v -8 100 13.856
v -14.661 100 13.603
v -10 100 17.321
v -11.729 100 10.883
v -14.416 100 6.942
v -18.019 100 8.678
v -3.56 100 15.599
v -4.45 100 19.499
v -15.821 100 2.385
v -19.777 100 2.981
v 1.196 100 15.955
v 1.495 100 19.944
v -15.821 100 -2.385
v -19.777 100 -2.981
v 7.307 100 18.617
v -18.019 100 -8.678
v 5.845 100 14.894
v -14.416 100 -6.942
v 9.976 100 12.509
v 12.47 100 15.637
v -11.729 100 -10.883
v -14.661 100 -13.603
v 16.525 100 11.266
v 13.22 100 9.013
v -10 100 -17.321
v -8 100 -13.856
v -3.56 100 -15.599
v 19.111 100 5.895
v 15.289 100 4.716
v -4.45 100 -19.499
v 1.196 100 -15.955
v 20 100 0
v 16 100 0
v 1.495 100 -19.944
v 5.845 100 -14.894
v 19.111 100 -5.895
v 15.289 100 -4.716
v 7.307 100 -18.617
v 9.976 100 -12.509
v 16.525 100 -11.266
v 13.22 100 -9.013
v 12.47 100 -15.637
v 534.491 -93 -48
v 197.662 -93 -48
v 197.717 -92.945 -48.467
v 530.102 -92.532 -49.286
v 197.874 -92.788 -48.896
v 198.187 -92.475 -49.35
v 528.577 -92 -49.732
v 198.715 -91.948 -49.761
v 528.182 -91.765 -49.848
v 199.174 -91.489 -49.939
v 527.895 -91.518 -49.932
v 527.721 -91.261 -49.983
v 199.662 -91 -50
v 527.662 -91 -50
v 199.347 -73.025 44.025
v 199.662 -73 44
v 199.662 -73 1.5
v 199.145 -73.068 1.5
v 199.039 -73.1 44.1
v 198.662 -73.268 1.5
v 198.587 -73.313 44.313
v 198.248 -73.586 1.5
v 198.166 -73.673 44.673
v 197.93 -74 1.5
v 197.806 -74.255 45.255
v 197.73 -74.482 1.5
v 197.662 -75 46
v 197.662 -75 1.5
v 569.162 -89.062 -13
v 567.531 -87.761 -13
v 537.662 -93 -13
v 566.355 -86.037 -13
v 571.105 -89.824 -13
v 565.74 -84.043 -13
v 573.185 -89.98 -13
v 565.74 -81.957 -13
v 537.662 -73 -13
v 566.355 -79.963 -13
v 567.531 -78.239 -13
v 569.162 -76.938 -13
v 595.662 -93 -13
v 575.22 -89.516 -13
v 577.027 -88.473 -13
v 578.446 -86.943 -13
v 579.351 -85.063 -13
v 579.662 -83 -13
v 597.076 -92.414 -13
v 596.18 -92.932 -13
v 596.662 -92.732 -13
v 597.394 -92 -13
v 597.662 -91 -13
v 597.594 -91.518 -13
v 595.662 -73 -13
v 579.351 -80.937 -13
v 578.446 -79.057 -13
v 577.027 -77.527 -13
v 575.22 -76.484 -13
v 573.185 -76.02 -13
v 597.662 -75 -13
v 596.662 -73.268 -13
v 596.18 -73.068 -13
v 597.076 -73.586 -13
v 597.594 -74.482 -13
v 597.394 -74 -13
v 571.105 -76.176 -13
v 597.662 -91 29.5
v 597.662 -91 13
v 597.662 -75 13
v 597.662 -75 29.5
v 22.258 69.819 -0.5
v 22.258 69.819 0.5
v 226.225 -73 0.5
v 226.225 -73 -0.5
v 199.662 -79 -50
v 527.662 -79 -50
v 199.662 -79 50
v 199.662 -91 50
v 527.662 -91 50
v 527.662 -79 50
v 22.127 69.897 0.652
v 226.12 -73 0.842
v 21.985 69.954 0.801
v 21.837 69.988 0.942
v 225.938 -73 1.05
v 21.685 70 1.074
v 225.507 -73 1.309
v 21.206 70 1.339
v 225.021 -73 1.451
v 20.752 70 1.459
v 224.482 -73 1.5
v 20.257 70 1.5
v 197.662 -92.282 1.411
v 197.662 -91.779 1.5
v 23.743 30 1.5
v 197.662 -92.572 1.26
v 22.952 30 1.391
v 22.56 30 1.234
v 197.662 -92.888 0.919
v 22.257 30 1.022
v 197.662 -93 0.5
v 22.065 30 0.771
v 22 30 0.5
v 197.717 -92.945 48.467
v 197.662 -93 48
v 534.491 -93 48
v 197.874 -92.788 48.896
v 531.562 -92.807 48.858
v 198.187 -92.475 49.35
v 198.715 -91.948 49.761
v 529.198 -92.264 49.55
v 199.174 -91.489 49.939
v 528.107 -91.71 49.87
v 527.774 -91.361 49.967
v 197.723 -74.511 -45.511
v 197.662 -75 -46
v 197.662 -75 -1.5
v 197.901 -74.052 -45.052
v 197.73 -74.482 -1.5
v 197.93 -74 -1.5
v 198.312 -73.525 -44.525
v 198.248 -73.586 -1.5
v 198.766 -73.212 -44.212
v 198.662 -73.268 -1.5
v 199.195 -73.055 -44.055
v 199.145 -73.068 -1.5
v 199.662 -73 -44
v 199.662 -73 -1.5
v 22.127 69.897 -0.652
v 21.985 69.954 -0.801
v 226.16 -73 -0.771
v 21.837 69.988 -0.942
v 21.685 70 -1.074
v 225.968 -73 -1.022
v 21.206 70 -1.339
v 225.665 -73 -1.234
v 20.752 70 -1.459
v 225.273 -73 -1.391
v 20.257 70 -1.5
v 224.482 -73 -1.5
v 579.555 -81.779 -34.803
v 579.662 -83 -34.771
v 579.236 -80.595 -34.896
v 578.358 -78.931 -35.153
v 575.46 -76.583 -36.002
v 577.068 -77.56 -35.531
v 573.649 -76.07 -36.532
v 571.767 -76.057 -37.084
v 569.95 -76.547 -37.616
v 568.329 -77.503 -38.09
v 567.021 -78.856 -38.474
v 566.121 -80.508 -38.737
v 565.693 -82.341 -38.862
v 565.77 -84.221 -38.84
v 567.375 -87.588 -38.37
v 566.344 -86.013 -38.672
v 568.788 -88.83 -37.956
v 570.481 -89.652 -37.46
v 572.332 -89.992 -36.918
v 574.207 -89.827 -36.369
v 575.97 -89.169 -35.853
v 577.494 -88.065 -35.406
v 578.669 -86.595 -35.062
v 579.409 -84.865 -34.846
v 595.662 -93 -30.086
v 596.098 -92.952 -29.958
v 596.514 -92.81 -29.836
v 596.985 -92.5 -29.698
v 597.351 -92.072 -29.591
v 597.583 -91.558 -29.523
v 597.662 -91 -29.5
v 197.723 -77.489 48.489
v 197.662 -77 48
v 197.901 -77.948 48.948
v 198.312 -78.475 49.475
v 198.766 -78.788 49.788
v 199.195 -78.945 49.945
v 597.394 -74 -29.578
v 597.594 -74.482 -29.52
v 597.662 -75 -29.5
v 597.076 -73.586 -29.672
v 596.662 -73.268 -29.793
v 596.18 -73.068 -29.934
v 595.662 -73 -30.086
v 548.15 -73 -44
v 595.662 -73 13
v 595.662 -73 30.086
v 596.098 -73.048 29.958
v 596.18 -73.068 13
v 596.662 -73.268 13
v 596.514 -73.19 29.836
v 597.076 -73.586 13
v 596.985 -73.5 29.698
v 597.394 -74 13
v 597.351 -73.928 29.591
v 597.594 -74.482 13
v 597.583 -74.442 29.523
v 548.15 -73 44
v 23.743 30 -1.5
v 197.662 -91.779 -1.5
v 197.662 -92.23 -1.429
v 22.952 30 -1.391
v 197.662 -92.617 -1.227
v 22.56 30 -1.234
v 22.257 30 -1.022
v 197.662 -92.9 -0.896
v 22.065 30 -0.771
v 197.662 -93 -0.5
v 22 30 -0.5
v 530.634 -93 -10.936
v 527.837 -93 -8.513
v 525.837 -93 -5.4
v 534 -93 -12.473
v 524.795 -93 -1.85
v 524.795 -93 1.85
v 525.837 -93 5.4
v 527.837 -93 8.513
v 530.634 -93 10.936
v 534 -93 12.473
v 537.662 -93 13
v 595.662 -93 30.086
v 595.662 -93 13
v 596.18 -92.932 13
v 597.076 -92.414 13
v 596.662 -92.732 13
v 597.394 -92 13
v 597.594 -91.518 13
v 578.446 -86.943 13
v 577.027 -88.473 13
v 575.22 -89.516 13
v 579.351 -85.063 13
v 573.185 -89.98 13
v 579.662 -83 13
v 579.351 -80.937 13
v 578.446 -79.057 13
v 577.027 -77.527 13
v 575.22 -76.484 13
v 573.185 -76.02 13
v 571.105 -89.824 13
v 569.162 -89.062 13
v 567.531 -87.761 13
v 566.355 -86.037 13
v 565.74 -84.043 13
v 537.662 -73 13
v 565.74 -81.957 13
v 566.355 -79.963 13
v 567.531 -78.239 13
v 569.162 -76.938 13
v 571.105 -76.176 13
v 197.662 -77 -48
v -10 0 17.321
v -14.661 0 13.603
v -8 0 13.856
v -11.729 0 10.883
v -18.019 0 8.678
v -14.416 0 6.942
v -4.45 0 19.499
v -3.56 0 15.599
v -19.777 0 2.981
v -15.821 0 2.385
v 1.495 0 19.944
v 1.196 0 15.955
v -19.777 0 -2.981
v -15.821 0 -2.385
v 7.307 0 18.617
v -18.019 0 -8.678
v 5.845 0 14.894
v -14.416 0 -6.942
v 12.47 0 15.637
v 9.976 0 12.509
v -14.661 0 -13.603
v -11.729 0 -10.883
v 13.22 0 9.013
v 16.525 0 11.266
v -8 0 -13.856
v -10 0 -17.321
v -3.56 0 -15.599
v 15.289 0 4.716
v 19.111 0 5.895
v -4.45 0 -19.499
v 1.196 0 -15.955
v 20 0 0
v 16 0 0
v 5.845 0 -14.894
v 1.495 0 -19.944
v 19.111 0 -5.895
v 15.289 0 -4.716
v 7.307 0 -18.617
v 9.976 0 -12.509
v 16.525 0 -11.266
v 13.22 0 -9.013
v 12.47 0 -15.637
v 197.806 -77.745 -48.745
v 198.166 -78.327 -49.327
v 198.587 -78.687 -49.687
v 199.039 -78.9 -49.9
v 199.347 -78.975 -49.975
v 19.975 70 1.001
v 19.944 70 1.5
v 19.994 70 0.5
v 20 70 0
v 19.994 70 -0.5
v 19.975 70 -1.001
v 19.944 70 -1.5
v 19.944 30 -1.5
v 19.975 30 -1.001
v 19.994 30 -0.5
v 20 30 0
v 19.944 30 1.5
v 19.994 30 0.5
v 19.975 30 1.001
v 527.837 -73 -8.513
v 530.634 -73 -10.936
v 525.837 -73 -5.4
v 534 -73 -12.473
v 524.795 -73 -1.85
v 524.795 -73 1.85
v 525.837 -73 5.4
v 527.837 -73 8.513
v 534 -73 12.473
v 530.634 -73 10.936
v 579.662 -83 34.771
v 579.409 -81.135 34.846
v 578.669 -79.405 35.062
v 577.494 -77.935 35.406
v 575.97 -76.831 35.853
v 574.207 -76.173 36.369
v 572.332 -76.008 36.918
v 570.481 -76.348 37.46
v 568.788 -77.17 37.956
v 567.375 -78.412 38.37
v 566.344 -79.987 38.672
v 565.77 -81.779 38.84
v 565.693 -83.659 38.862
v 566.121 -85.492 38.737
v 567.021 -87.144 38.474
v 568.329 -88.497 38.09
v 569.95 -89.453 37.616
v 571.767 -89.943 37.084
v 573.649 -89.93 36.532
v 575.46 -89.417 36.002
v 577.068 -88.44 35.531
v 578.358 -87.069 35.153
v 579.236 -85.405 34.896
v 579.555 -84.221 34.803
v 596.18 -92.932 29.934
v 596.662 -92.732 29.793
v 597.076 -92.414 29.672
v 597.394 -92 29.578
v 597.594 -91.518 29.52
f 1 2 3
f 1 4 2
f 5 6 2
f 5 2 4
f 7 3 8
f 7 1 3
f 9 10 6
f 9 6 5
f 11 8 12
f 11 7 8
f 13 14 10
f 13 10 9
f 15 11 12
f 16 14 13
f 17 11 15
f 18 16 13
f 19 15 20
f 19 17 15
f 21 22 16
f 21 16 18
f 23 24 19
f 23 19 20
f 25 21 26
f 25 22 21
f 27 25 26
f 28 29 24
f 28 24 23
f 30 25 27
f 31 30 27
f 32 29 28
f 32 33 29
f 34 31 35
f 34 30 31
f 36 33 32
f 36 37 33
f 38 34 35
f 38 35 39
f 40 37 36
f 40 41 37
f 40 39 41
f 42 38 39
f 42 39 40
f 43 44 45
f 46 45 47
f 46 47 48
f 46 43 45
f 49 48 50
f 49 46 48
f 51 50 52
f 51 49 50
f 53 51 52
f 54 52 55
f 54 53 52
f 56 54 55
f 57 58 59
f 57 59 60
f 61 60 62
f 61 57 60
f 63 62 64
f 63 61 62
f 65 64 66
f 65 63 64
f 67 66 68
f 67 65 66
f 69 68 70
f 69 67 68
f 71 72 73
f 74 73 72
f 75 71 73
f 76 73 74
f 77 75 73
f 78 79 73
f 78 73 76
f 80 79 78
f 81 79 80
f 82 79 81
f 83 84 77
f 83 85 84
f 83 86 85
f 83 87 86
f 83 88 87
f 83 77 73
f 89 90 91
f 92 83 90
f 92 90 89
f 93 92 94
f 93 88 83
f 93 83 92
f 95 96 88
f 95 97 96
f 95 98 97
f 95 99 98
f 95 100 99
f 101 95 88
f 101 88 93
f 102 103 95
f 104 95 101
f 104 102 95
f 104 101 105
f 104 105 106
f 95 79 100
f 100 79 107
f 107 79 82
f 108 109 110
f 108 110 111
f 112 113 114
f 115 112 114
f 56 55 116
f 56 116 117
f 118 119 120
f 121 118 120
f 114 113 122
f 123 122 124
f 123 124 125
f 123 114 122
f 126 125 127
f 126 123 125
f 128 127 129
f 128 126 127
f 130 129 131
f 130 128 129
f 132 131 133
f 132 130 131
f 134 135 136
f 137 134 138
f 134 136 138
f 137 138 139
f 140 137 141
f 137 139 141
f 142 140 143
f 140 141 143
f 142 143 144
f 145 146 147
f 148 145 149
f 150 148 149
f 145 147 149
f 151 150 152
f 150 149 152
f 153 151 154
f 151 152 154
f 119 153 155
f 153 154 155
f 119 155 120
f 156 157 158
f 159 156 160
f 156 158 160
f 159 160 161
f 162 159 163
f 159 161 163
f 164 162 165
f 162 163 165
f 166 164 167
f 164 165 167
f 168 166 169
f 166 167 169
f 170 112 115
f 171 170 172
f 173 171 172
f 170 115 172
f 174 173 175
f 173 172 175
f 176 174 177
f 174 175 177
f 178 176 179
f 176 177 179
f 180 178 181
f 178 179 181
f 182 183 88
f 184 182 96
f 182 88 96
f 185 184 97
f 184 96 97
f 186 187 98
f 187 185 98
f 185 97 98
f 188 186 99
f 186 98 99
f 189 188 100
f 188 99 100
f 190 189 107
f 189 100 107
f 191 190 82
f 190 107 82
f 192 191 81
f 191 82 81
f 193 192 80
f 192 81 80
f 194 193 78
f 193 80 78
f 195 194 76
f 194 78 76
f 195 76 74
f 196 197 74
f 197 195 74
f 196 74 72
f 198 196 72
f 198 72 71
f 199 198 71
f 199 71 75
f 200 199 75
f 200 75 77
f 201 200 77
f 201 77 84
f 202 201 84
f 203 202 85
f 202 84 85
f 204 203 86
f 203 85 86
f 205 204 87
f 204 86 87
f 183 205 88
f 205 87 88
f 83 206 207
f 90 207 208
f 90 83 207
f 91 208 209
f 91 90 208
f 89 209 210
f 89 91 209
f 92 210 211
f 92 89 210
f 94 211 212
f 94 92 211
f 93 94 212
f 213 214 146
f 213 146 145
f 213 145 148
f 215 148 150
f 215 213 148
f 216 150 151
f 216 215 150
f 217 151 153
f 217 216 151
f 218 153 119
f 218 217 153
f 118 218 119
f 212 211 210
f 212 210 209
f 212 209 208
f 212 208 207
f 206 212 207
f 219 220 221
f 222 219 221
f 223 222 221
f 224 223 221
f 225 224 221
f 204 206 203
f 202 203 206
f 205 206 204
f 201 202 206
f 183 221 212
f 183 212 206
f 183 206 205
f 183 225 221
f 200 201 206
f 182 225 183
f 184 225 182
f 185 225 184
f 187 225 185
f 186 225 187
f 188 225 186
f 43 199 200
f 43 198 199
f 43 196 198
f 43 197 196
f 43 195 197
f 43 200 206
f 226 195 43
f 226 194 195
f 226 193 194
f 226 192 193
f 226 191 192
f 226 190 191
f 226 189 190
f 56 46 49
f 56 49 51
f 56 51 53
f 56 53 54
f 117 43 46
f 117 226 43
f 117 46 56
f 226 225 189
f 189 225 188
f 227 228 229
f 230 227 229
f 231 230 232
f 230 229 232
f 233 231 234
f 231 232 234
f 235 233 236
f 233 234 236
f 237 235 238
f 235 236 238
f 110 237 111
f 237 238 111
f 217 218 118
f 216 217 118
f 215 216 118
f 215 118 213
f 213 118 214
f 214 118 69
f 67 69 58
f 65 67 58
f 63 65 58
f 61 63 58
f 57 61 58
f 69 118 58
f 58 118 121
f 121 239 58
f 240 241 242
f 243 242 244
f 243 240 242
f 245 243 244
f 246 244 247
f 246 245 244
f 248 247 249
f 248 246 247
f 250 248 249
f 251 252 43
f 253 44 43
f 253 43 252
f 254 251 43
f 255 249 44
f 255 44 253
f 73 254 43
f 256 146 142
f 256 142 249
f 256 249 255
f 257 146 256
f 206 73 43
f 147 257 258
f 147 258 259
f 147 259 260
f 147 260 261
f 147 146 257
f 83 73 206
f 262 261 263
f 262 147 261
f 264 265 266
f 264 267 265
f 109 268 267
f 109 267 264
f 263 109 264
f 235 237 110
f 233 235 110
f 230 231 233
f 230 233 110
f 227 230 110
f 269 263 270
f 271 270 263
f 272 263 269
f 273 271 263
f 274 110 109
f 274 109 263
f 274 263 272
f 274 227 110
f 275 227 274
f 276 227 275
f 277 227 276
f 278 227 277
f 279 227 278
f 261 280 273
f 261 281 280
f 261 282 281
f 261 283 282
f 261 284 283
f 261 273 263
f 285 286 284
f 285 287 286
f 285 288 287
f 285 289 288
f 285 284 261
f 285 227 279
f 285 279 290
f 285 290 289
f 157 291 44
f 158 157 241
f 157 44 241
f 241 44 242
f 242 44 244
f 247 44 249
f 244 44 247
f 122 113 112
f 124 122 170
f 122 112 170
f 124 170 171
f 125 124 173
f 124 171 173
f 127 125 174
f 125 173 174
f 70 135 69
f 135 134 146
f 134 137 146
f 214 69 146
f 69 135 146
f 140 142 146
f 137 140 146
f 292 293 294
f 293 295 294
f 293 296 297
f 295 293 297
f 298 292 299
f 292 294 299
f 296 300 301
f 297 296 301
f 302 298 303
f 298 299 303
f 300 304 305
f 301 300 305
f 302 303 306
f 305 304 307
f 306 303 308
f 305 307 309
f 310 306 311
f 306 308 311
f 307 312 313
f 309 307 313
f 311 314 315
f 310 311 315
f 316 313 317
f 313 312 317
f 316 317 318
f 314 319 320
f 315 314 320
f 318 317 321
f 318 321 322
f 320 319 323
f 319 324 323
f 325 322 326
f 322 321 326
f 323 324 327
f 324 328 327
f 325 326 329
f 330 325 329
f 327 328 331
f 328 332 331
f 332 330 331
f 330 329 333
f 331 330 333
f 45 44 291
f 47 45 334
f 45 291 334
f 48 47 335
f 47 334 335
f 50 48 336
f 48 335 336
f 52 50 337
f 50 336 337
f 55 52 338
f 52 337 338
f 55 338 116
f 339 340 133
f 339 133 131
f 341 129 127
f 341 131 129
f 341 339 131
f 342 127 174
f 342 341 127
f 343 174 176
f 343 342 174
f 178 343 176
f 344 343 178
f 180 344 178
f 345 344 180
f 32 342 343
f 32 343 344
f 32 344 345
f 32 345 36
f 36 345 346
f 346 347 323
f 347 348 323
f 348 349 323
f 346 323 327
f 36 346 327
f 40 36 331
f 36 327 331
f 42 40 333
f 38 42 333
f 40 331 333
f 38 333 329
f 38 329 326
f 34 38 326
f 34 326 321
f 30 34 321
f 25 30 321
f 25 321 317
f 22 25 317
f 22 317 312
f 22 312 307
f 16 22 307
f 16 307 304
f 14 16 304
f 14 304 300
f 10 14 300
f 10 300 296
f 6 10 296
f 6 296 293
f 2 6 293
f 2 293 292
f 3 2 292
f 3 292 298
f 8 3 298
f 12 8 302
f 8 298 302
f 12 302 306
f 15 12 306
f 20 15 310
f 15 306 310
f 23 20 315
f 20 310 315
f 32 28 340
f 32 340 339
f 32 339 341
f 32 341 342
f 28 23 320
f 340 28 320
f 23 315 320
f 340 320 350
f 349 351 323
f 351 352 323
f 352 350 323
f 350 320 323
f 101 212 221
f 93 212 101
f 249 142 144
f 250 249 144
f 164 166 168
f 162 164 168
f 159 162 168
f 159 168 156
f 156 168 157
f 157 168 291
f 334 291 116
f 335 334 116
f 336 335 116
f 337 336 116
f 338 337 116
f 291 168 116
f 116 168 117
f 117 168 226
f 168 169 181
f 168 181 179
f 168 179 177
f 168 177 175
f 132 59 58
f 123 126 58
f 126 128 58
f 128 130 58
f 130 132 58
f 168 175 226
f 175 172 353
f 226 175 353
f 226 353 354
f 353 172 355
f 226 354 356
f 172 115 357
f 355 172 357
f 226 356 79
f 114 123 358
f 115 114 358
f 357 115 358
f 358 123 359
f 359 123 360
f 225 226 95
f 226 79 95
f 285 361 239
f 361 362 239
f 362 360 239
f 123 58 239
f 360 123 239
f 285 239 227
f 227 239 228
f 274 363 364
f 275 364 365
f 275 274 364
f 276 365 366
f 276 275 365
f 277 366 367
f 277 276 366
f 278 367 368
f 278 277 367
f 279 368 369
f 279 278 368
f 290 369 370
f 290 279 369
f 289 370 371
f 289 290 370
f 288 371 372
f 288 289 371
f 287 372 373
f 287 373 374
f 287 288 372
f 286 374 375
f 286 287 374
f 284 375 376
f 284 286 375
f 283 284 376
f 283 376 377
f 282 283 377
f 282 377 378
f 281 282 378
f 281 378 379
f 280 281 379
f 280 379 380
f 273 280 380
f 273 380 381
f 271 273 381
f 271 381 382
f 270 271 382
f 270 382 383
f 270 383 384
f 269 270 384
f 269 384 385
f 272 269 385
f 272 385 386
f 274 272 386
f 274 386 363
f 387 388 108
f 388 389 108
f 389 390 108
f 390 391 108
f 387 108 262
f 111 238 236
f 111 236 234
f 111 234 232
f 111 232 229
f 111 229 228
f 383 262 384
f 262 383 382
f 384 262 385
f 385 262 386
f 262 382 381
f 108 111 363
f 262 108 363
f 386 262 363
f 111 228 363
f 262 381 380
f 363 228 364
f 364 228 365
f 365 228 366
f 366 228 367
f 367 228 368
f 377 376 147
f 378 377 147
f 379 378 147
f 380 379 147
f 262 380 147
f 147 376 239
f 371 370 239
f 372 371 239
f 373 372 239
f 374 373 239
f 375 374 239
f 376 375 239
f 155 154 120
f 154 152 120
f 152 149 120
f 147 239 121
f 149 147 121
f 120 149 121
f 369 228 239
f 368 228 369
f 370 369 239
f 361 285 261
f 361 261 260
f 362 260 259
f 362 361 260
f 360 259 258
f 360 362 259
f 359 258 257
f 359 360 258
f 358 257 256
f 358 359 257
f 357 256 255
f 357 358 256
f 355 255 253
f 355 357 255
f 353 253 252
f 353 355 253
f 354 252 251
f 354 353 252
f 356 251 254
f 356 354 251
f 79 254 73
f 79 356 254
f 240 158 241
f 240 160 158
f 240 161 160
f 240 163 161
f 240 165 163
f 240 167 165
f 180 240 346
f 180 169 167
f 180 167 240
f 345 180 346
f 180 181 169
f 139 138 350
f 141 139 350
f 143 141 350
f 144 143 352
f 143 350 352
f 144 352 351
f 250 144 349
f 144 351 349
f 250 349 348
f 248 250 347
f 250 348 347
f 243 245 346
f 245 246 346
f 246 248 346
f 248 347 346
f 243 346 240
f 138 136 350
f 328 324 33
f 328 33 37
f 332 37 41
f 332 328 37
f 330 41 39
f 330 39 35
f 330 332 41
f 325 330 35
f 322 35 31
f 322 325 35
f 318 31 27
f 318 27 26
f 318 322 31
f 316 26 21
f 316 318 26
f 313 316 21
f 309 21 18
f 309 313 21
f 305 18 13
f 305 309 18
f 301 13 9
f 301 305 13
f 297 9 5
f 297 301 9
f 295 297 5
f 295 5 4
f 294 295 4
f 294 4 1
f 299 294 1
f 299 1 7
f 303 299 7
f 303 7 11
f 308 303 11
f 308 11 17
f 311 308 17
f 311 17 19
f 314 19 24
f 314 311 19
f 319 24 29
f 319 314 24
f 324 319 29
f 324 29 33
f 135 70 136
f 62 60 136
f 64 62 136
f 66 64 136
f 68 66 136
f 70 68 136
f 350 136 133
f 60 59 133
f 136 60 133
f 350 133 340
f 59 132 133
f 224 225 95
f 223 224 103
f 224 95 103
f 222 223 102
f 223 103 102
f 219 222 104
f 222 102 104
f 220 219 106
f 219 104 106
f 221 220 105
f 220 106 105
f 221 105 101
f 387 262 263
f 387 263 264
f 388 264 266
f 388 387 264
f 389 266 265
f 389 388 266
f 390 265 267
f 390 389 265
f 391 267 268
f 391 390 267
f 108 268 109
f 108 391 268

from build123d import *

# Parameters (mm, degrees)
SKETCH1_R               = 20
SKETCH1_R_2             = 16
BOSS_EXTRUDE1_DEPTH     = 100
SKETCH2_W               = 3
SKETCH2_H               = 40
BOSS_EXTRUDE11_DEPTH    = 2
SKETCH3_W               = 3
SKETCH3_H               = 40
BOSS_EXTRUDE12_DEPTH    = 2
BOSS_EXTRUDE13_DEPTH    = 3
FILLET1_R               = 1
SKETCH5_W               = 400
SKETCH5_H               = 100
BOSS_EXTRUDE14_DEPTH    = 20
FILLET2_R               = 2
CUT_EXTRUDE1_DEPTH      = 1
CUT_EXTRUDE1_DEPTH_BACK = 618.662204829
CUT_EXTRUDE2_DEPTH      = 1
CUT_EXTRUDE2_DEPTH_BACK = 618.662204829
CUT_EXTRUDE3_DEPTH      = 21
CUT_EXTRUDE4_DEPTH      = 21
SKETCH11_R              = 7
CUT_EXTRUDE5_DEPTH      = 64
CUT_EXTRUDE5_DEPTH_BACK = 38


with BuildPart() as part:
    # Sketch1 → Boss-Extrude1 (new body)
    with BuildSketch(Plane(origin=(0, 0, 0), x_dir=(1, 0, 0), z_dir=(0, 1, 0))):
        Circle(SKETCH1_R)
        Circle(SKETCH1_R_2, mode=Mode.SUBTRACT)
    extrude(amount=BOSS_EXTRUDE1_DEPTH)

    # Sketch2 → Boss-Extrude11 (add)
    with BuildSketch(Plane(origin=(20, 0, 0), x_dir=(0, 0, -1), z_dir=(1, 0, 0))):
        with Locations((0, 50)):
            Rectangle(SKETCH2_W, SKETCH2_H)
    extrude(amount=-BOSS_EXTRUDE11_DEPTH)

    # Sketch3 → Boss-Extrude12 (add)
    with BuildSketch(Plane(origin=(20, 0, 0), x_dir=(0, 0, -1), z_dir=(1, 0, 0))):
        with Locations((0, 50)):
            Rectangle(SKETCH3_W, SKETCH3_H)
    extrude(amount=BOSS_EXTRUDE12_DEPTH)

    # Sketch4 → Boss-Extrude13 (add)
    with BuildSketch(Plane.XY.offset(1.5)):
        Polygon((22, 70), (254.788125099, -93), (197.662204829, -93), (22, 30), align=None)
    extrude(amount=-BOSS_EXTRUDE13_DEPTH)

    # Fillet1
    fillet1_edges = [part.edges().sort_by_distance(p)[0] for p in [
        (22, 70, 0),
        (138.394062549, -11.5, -1.5),
        (254.788125099, -93, 0),
        (109.831102415, -31.5, -1.5),
        (109.831102415, -31.5, 1.5),
        (138.394062549, -11.5, 1.5),
    ]]
    fillet(fillet1_edges, radius=FILLET1_R)

    # Sketch5 → Boss-Extrude14 (add)
    with BuildSketch(Plane.XZ.offset(93)):
        with Locations((397.662204829, 0)):
            Rectangle(SKETCH5_W, SKETCH5_H)
    extrude(amount=-BOSS_EXTRUDE14_DEPTH)

    # Fillet2
    fillet2_edges = [part.edges().sort_by_distance(p)[0] for p in [
        (197.662204829, -73, -25.75),
        (197.662204829, -83, -50),
        (397.662204829, -73, 50),
        (197.662204829, -83, 50),
        (597.662204829, -73, 0),
        (597.662204829, -83, 50),
        (397.662204829, -73, -50),
        (597.662204829, -83, -50),
        (197.662204829, -73, 25.75),
        (397.662204829, -93, -50),
        (597.662204829, -93, 0),
        (397.662204829, -93, 50),
    ]]
    fillet(fillet2_edges, radius=FILLET2_R)

    # Sketch6 → Cut-Extrude1 (cut, two sides)
    with BuildSketch(Plane(origin=(597.662204829, 0, 0), x_dir=(0, 0, -1), z_dir=(1, 0, 0))) as cut_extrude1_sk:
        Polygon((-52, -81), (-42, -71), (-52, -71), align=None)
    extrude(amount=CUT_EXTRUDE1_DEPTH, mode=Mode.SUBTRACT)
    extrude(cut_extrude1_sk.sketch, amount=-CUT_EXTRUDE1_DEPTH_BACK, mode=Mode.SUBTRACT)

    # Sketch7 → Cut-Extrude2 (cut, two sides)
    with BuildSketch(Plane(origin=(597.662204829, 0, 0), x_dir=(0, 0, -1), z_dir=(1, 0, 0))) as cut_extrude2_sk:
        Polygon((42, -71), (52, -81), (52, -71), align=None)
    extrude(amount=CUT_EXTRUDE2_DEPTH, mode=Mode.SUBTRACT)
    extrude(cut_extrude2_sk.sketch, amount=-CUT_EXTRUDE2_DEPTH_BACK, mode=Mode.SUBTRACT)

    # Sketch8 → Cut-Extrude3 (cut, through all)
    with BuildSketch(Plane(origin=(0, -73, 0), x_dir=(1, 0, 0), z_dir=(0, 1, 0))):
        with BuildLine():
            Line((537.662204829, 13), (597.662204829, 13))
            Line((597.662204829, 13), (597.662204829, -13))
            Line((597.662204829, -13), (537.662204829, -13))
            ThreePointArc((537.662204829, -13), (524.662204829, 0), (537.662204829, 13))
        make_face()
    extrude(amount=-CUT_EXTRUDE3_DEPTH, mode=Mode.SUBTRACT)

    # Sketch9 → Cut-Extrude4 (cut, through all)
    with BuildSketch(Plane(origin=(0, -73, 0), x_dir=(1, 0, 0), z_dir=(0, 1, 0))):
        Polygon((527.662204829, 50), (597.662204829, 50), (597.662204829, 29.5), align=None)
    cut_extrude4 = extrude(amount=-CUT_EXTRUDE4_DEPTH, mode=Mode.SUBTRACT)

    # Mirror1: Cut-Extrude4 across plane
    add(cut_extrude4.mirror(Plane.XY), mode=Mode.SUBTRACT)

    # Sketch11 → Cut-Extrude5 (cut, two sides)
    with BuildSketch(Plane.XY.offset(-13)) as cut_extrude5_sk:
        with Locations((572.662204829, -83)):
            Circle(SKETCH11_R)
    extrude(amount=CUT_EXTRUDE5_DEPTH, mode=Mode.SUBTRACT)
    extrude(cut_extrude5_sk.sketch, amount=-CUT_EXTRUDE5_DEPTH_BACK, mode=Mode.SUBTRACT)


solid = part.part
